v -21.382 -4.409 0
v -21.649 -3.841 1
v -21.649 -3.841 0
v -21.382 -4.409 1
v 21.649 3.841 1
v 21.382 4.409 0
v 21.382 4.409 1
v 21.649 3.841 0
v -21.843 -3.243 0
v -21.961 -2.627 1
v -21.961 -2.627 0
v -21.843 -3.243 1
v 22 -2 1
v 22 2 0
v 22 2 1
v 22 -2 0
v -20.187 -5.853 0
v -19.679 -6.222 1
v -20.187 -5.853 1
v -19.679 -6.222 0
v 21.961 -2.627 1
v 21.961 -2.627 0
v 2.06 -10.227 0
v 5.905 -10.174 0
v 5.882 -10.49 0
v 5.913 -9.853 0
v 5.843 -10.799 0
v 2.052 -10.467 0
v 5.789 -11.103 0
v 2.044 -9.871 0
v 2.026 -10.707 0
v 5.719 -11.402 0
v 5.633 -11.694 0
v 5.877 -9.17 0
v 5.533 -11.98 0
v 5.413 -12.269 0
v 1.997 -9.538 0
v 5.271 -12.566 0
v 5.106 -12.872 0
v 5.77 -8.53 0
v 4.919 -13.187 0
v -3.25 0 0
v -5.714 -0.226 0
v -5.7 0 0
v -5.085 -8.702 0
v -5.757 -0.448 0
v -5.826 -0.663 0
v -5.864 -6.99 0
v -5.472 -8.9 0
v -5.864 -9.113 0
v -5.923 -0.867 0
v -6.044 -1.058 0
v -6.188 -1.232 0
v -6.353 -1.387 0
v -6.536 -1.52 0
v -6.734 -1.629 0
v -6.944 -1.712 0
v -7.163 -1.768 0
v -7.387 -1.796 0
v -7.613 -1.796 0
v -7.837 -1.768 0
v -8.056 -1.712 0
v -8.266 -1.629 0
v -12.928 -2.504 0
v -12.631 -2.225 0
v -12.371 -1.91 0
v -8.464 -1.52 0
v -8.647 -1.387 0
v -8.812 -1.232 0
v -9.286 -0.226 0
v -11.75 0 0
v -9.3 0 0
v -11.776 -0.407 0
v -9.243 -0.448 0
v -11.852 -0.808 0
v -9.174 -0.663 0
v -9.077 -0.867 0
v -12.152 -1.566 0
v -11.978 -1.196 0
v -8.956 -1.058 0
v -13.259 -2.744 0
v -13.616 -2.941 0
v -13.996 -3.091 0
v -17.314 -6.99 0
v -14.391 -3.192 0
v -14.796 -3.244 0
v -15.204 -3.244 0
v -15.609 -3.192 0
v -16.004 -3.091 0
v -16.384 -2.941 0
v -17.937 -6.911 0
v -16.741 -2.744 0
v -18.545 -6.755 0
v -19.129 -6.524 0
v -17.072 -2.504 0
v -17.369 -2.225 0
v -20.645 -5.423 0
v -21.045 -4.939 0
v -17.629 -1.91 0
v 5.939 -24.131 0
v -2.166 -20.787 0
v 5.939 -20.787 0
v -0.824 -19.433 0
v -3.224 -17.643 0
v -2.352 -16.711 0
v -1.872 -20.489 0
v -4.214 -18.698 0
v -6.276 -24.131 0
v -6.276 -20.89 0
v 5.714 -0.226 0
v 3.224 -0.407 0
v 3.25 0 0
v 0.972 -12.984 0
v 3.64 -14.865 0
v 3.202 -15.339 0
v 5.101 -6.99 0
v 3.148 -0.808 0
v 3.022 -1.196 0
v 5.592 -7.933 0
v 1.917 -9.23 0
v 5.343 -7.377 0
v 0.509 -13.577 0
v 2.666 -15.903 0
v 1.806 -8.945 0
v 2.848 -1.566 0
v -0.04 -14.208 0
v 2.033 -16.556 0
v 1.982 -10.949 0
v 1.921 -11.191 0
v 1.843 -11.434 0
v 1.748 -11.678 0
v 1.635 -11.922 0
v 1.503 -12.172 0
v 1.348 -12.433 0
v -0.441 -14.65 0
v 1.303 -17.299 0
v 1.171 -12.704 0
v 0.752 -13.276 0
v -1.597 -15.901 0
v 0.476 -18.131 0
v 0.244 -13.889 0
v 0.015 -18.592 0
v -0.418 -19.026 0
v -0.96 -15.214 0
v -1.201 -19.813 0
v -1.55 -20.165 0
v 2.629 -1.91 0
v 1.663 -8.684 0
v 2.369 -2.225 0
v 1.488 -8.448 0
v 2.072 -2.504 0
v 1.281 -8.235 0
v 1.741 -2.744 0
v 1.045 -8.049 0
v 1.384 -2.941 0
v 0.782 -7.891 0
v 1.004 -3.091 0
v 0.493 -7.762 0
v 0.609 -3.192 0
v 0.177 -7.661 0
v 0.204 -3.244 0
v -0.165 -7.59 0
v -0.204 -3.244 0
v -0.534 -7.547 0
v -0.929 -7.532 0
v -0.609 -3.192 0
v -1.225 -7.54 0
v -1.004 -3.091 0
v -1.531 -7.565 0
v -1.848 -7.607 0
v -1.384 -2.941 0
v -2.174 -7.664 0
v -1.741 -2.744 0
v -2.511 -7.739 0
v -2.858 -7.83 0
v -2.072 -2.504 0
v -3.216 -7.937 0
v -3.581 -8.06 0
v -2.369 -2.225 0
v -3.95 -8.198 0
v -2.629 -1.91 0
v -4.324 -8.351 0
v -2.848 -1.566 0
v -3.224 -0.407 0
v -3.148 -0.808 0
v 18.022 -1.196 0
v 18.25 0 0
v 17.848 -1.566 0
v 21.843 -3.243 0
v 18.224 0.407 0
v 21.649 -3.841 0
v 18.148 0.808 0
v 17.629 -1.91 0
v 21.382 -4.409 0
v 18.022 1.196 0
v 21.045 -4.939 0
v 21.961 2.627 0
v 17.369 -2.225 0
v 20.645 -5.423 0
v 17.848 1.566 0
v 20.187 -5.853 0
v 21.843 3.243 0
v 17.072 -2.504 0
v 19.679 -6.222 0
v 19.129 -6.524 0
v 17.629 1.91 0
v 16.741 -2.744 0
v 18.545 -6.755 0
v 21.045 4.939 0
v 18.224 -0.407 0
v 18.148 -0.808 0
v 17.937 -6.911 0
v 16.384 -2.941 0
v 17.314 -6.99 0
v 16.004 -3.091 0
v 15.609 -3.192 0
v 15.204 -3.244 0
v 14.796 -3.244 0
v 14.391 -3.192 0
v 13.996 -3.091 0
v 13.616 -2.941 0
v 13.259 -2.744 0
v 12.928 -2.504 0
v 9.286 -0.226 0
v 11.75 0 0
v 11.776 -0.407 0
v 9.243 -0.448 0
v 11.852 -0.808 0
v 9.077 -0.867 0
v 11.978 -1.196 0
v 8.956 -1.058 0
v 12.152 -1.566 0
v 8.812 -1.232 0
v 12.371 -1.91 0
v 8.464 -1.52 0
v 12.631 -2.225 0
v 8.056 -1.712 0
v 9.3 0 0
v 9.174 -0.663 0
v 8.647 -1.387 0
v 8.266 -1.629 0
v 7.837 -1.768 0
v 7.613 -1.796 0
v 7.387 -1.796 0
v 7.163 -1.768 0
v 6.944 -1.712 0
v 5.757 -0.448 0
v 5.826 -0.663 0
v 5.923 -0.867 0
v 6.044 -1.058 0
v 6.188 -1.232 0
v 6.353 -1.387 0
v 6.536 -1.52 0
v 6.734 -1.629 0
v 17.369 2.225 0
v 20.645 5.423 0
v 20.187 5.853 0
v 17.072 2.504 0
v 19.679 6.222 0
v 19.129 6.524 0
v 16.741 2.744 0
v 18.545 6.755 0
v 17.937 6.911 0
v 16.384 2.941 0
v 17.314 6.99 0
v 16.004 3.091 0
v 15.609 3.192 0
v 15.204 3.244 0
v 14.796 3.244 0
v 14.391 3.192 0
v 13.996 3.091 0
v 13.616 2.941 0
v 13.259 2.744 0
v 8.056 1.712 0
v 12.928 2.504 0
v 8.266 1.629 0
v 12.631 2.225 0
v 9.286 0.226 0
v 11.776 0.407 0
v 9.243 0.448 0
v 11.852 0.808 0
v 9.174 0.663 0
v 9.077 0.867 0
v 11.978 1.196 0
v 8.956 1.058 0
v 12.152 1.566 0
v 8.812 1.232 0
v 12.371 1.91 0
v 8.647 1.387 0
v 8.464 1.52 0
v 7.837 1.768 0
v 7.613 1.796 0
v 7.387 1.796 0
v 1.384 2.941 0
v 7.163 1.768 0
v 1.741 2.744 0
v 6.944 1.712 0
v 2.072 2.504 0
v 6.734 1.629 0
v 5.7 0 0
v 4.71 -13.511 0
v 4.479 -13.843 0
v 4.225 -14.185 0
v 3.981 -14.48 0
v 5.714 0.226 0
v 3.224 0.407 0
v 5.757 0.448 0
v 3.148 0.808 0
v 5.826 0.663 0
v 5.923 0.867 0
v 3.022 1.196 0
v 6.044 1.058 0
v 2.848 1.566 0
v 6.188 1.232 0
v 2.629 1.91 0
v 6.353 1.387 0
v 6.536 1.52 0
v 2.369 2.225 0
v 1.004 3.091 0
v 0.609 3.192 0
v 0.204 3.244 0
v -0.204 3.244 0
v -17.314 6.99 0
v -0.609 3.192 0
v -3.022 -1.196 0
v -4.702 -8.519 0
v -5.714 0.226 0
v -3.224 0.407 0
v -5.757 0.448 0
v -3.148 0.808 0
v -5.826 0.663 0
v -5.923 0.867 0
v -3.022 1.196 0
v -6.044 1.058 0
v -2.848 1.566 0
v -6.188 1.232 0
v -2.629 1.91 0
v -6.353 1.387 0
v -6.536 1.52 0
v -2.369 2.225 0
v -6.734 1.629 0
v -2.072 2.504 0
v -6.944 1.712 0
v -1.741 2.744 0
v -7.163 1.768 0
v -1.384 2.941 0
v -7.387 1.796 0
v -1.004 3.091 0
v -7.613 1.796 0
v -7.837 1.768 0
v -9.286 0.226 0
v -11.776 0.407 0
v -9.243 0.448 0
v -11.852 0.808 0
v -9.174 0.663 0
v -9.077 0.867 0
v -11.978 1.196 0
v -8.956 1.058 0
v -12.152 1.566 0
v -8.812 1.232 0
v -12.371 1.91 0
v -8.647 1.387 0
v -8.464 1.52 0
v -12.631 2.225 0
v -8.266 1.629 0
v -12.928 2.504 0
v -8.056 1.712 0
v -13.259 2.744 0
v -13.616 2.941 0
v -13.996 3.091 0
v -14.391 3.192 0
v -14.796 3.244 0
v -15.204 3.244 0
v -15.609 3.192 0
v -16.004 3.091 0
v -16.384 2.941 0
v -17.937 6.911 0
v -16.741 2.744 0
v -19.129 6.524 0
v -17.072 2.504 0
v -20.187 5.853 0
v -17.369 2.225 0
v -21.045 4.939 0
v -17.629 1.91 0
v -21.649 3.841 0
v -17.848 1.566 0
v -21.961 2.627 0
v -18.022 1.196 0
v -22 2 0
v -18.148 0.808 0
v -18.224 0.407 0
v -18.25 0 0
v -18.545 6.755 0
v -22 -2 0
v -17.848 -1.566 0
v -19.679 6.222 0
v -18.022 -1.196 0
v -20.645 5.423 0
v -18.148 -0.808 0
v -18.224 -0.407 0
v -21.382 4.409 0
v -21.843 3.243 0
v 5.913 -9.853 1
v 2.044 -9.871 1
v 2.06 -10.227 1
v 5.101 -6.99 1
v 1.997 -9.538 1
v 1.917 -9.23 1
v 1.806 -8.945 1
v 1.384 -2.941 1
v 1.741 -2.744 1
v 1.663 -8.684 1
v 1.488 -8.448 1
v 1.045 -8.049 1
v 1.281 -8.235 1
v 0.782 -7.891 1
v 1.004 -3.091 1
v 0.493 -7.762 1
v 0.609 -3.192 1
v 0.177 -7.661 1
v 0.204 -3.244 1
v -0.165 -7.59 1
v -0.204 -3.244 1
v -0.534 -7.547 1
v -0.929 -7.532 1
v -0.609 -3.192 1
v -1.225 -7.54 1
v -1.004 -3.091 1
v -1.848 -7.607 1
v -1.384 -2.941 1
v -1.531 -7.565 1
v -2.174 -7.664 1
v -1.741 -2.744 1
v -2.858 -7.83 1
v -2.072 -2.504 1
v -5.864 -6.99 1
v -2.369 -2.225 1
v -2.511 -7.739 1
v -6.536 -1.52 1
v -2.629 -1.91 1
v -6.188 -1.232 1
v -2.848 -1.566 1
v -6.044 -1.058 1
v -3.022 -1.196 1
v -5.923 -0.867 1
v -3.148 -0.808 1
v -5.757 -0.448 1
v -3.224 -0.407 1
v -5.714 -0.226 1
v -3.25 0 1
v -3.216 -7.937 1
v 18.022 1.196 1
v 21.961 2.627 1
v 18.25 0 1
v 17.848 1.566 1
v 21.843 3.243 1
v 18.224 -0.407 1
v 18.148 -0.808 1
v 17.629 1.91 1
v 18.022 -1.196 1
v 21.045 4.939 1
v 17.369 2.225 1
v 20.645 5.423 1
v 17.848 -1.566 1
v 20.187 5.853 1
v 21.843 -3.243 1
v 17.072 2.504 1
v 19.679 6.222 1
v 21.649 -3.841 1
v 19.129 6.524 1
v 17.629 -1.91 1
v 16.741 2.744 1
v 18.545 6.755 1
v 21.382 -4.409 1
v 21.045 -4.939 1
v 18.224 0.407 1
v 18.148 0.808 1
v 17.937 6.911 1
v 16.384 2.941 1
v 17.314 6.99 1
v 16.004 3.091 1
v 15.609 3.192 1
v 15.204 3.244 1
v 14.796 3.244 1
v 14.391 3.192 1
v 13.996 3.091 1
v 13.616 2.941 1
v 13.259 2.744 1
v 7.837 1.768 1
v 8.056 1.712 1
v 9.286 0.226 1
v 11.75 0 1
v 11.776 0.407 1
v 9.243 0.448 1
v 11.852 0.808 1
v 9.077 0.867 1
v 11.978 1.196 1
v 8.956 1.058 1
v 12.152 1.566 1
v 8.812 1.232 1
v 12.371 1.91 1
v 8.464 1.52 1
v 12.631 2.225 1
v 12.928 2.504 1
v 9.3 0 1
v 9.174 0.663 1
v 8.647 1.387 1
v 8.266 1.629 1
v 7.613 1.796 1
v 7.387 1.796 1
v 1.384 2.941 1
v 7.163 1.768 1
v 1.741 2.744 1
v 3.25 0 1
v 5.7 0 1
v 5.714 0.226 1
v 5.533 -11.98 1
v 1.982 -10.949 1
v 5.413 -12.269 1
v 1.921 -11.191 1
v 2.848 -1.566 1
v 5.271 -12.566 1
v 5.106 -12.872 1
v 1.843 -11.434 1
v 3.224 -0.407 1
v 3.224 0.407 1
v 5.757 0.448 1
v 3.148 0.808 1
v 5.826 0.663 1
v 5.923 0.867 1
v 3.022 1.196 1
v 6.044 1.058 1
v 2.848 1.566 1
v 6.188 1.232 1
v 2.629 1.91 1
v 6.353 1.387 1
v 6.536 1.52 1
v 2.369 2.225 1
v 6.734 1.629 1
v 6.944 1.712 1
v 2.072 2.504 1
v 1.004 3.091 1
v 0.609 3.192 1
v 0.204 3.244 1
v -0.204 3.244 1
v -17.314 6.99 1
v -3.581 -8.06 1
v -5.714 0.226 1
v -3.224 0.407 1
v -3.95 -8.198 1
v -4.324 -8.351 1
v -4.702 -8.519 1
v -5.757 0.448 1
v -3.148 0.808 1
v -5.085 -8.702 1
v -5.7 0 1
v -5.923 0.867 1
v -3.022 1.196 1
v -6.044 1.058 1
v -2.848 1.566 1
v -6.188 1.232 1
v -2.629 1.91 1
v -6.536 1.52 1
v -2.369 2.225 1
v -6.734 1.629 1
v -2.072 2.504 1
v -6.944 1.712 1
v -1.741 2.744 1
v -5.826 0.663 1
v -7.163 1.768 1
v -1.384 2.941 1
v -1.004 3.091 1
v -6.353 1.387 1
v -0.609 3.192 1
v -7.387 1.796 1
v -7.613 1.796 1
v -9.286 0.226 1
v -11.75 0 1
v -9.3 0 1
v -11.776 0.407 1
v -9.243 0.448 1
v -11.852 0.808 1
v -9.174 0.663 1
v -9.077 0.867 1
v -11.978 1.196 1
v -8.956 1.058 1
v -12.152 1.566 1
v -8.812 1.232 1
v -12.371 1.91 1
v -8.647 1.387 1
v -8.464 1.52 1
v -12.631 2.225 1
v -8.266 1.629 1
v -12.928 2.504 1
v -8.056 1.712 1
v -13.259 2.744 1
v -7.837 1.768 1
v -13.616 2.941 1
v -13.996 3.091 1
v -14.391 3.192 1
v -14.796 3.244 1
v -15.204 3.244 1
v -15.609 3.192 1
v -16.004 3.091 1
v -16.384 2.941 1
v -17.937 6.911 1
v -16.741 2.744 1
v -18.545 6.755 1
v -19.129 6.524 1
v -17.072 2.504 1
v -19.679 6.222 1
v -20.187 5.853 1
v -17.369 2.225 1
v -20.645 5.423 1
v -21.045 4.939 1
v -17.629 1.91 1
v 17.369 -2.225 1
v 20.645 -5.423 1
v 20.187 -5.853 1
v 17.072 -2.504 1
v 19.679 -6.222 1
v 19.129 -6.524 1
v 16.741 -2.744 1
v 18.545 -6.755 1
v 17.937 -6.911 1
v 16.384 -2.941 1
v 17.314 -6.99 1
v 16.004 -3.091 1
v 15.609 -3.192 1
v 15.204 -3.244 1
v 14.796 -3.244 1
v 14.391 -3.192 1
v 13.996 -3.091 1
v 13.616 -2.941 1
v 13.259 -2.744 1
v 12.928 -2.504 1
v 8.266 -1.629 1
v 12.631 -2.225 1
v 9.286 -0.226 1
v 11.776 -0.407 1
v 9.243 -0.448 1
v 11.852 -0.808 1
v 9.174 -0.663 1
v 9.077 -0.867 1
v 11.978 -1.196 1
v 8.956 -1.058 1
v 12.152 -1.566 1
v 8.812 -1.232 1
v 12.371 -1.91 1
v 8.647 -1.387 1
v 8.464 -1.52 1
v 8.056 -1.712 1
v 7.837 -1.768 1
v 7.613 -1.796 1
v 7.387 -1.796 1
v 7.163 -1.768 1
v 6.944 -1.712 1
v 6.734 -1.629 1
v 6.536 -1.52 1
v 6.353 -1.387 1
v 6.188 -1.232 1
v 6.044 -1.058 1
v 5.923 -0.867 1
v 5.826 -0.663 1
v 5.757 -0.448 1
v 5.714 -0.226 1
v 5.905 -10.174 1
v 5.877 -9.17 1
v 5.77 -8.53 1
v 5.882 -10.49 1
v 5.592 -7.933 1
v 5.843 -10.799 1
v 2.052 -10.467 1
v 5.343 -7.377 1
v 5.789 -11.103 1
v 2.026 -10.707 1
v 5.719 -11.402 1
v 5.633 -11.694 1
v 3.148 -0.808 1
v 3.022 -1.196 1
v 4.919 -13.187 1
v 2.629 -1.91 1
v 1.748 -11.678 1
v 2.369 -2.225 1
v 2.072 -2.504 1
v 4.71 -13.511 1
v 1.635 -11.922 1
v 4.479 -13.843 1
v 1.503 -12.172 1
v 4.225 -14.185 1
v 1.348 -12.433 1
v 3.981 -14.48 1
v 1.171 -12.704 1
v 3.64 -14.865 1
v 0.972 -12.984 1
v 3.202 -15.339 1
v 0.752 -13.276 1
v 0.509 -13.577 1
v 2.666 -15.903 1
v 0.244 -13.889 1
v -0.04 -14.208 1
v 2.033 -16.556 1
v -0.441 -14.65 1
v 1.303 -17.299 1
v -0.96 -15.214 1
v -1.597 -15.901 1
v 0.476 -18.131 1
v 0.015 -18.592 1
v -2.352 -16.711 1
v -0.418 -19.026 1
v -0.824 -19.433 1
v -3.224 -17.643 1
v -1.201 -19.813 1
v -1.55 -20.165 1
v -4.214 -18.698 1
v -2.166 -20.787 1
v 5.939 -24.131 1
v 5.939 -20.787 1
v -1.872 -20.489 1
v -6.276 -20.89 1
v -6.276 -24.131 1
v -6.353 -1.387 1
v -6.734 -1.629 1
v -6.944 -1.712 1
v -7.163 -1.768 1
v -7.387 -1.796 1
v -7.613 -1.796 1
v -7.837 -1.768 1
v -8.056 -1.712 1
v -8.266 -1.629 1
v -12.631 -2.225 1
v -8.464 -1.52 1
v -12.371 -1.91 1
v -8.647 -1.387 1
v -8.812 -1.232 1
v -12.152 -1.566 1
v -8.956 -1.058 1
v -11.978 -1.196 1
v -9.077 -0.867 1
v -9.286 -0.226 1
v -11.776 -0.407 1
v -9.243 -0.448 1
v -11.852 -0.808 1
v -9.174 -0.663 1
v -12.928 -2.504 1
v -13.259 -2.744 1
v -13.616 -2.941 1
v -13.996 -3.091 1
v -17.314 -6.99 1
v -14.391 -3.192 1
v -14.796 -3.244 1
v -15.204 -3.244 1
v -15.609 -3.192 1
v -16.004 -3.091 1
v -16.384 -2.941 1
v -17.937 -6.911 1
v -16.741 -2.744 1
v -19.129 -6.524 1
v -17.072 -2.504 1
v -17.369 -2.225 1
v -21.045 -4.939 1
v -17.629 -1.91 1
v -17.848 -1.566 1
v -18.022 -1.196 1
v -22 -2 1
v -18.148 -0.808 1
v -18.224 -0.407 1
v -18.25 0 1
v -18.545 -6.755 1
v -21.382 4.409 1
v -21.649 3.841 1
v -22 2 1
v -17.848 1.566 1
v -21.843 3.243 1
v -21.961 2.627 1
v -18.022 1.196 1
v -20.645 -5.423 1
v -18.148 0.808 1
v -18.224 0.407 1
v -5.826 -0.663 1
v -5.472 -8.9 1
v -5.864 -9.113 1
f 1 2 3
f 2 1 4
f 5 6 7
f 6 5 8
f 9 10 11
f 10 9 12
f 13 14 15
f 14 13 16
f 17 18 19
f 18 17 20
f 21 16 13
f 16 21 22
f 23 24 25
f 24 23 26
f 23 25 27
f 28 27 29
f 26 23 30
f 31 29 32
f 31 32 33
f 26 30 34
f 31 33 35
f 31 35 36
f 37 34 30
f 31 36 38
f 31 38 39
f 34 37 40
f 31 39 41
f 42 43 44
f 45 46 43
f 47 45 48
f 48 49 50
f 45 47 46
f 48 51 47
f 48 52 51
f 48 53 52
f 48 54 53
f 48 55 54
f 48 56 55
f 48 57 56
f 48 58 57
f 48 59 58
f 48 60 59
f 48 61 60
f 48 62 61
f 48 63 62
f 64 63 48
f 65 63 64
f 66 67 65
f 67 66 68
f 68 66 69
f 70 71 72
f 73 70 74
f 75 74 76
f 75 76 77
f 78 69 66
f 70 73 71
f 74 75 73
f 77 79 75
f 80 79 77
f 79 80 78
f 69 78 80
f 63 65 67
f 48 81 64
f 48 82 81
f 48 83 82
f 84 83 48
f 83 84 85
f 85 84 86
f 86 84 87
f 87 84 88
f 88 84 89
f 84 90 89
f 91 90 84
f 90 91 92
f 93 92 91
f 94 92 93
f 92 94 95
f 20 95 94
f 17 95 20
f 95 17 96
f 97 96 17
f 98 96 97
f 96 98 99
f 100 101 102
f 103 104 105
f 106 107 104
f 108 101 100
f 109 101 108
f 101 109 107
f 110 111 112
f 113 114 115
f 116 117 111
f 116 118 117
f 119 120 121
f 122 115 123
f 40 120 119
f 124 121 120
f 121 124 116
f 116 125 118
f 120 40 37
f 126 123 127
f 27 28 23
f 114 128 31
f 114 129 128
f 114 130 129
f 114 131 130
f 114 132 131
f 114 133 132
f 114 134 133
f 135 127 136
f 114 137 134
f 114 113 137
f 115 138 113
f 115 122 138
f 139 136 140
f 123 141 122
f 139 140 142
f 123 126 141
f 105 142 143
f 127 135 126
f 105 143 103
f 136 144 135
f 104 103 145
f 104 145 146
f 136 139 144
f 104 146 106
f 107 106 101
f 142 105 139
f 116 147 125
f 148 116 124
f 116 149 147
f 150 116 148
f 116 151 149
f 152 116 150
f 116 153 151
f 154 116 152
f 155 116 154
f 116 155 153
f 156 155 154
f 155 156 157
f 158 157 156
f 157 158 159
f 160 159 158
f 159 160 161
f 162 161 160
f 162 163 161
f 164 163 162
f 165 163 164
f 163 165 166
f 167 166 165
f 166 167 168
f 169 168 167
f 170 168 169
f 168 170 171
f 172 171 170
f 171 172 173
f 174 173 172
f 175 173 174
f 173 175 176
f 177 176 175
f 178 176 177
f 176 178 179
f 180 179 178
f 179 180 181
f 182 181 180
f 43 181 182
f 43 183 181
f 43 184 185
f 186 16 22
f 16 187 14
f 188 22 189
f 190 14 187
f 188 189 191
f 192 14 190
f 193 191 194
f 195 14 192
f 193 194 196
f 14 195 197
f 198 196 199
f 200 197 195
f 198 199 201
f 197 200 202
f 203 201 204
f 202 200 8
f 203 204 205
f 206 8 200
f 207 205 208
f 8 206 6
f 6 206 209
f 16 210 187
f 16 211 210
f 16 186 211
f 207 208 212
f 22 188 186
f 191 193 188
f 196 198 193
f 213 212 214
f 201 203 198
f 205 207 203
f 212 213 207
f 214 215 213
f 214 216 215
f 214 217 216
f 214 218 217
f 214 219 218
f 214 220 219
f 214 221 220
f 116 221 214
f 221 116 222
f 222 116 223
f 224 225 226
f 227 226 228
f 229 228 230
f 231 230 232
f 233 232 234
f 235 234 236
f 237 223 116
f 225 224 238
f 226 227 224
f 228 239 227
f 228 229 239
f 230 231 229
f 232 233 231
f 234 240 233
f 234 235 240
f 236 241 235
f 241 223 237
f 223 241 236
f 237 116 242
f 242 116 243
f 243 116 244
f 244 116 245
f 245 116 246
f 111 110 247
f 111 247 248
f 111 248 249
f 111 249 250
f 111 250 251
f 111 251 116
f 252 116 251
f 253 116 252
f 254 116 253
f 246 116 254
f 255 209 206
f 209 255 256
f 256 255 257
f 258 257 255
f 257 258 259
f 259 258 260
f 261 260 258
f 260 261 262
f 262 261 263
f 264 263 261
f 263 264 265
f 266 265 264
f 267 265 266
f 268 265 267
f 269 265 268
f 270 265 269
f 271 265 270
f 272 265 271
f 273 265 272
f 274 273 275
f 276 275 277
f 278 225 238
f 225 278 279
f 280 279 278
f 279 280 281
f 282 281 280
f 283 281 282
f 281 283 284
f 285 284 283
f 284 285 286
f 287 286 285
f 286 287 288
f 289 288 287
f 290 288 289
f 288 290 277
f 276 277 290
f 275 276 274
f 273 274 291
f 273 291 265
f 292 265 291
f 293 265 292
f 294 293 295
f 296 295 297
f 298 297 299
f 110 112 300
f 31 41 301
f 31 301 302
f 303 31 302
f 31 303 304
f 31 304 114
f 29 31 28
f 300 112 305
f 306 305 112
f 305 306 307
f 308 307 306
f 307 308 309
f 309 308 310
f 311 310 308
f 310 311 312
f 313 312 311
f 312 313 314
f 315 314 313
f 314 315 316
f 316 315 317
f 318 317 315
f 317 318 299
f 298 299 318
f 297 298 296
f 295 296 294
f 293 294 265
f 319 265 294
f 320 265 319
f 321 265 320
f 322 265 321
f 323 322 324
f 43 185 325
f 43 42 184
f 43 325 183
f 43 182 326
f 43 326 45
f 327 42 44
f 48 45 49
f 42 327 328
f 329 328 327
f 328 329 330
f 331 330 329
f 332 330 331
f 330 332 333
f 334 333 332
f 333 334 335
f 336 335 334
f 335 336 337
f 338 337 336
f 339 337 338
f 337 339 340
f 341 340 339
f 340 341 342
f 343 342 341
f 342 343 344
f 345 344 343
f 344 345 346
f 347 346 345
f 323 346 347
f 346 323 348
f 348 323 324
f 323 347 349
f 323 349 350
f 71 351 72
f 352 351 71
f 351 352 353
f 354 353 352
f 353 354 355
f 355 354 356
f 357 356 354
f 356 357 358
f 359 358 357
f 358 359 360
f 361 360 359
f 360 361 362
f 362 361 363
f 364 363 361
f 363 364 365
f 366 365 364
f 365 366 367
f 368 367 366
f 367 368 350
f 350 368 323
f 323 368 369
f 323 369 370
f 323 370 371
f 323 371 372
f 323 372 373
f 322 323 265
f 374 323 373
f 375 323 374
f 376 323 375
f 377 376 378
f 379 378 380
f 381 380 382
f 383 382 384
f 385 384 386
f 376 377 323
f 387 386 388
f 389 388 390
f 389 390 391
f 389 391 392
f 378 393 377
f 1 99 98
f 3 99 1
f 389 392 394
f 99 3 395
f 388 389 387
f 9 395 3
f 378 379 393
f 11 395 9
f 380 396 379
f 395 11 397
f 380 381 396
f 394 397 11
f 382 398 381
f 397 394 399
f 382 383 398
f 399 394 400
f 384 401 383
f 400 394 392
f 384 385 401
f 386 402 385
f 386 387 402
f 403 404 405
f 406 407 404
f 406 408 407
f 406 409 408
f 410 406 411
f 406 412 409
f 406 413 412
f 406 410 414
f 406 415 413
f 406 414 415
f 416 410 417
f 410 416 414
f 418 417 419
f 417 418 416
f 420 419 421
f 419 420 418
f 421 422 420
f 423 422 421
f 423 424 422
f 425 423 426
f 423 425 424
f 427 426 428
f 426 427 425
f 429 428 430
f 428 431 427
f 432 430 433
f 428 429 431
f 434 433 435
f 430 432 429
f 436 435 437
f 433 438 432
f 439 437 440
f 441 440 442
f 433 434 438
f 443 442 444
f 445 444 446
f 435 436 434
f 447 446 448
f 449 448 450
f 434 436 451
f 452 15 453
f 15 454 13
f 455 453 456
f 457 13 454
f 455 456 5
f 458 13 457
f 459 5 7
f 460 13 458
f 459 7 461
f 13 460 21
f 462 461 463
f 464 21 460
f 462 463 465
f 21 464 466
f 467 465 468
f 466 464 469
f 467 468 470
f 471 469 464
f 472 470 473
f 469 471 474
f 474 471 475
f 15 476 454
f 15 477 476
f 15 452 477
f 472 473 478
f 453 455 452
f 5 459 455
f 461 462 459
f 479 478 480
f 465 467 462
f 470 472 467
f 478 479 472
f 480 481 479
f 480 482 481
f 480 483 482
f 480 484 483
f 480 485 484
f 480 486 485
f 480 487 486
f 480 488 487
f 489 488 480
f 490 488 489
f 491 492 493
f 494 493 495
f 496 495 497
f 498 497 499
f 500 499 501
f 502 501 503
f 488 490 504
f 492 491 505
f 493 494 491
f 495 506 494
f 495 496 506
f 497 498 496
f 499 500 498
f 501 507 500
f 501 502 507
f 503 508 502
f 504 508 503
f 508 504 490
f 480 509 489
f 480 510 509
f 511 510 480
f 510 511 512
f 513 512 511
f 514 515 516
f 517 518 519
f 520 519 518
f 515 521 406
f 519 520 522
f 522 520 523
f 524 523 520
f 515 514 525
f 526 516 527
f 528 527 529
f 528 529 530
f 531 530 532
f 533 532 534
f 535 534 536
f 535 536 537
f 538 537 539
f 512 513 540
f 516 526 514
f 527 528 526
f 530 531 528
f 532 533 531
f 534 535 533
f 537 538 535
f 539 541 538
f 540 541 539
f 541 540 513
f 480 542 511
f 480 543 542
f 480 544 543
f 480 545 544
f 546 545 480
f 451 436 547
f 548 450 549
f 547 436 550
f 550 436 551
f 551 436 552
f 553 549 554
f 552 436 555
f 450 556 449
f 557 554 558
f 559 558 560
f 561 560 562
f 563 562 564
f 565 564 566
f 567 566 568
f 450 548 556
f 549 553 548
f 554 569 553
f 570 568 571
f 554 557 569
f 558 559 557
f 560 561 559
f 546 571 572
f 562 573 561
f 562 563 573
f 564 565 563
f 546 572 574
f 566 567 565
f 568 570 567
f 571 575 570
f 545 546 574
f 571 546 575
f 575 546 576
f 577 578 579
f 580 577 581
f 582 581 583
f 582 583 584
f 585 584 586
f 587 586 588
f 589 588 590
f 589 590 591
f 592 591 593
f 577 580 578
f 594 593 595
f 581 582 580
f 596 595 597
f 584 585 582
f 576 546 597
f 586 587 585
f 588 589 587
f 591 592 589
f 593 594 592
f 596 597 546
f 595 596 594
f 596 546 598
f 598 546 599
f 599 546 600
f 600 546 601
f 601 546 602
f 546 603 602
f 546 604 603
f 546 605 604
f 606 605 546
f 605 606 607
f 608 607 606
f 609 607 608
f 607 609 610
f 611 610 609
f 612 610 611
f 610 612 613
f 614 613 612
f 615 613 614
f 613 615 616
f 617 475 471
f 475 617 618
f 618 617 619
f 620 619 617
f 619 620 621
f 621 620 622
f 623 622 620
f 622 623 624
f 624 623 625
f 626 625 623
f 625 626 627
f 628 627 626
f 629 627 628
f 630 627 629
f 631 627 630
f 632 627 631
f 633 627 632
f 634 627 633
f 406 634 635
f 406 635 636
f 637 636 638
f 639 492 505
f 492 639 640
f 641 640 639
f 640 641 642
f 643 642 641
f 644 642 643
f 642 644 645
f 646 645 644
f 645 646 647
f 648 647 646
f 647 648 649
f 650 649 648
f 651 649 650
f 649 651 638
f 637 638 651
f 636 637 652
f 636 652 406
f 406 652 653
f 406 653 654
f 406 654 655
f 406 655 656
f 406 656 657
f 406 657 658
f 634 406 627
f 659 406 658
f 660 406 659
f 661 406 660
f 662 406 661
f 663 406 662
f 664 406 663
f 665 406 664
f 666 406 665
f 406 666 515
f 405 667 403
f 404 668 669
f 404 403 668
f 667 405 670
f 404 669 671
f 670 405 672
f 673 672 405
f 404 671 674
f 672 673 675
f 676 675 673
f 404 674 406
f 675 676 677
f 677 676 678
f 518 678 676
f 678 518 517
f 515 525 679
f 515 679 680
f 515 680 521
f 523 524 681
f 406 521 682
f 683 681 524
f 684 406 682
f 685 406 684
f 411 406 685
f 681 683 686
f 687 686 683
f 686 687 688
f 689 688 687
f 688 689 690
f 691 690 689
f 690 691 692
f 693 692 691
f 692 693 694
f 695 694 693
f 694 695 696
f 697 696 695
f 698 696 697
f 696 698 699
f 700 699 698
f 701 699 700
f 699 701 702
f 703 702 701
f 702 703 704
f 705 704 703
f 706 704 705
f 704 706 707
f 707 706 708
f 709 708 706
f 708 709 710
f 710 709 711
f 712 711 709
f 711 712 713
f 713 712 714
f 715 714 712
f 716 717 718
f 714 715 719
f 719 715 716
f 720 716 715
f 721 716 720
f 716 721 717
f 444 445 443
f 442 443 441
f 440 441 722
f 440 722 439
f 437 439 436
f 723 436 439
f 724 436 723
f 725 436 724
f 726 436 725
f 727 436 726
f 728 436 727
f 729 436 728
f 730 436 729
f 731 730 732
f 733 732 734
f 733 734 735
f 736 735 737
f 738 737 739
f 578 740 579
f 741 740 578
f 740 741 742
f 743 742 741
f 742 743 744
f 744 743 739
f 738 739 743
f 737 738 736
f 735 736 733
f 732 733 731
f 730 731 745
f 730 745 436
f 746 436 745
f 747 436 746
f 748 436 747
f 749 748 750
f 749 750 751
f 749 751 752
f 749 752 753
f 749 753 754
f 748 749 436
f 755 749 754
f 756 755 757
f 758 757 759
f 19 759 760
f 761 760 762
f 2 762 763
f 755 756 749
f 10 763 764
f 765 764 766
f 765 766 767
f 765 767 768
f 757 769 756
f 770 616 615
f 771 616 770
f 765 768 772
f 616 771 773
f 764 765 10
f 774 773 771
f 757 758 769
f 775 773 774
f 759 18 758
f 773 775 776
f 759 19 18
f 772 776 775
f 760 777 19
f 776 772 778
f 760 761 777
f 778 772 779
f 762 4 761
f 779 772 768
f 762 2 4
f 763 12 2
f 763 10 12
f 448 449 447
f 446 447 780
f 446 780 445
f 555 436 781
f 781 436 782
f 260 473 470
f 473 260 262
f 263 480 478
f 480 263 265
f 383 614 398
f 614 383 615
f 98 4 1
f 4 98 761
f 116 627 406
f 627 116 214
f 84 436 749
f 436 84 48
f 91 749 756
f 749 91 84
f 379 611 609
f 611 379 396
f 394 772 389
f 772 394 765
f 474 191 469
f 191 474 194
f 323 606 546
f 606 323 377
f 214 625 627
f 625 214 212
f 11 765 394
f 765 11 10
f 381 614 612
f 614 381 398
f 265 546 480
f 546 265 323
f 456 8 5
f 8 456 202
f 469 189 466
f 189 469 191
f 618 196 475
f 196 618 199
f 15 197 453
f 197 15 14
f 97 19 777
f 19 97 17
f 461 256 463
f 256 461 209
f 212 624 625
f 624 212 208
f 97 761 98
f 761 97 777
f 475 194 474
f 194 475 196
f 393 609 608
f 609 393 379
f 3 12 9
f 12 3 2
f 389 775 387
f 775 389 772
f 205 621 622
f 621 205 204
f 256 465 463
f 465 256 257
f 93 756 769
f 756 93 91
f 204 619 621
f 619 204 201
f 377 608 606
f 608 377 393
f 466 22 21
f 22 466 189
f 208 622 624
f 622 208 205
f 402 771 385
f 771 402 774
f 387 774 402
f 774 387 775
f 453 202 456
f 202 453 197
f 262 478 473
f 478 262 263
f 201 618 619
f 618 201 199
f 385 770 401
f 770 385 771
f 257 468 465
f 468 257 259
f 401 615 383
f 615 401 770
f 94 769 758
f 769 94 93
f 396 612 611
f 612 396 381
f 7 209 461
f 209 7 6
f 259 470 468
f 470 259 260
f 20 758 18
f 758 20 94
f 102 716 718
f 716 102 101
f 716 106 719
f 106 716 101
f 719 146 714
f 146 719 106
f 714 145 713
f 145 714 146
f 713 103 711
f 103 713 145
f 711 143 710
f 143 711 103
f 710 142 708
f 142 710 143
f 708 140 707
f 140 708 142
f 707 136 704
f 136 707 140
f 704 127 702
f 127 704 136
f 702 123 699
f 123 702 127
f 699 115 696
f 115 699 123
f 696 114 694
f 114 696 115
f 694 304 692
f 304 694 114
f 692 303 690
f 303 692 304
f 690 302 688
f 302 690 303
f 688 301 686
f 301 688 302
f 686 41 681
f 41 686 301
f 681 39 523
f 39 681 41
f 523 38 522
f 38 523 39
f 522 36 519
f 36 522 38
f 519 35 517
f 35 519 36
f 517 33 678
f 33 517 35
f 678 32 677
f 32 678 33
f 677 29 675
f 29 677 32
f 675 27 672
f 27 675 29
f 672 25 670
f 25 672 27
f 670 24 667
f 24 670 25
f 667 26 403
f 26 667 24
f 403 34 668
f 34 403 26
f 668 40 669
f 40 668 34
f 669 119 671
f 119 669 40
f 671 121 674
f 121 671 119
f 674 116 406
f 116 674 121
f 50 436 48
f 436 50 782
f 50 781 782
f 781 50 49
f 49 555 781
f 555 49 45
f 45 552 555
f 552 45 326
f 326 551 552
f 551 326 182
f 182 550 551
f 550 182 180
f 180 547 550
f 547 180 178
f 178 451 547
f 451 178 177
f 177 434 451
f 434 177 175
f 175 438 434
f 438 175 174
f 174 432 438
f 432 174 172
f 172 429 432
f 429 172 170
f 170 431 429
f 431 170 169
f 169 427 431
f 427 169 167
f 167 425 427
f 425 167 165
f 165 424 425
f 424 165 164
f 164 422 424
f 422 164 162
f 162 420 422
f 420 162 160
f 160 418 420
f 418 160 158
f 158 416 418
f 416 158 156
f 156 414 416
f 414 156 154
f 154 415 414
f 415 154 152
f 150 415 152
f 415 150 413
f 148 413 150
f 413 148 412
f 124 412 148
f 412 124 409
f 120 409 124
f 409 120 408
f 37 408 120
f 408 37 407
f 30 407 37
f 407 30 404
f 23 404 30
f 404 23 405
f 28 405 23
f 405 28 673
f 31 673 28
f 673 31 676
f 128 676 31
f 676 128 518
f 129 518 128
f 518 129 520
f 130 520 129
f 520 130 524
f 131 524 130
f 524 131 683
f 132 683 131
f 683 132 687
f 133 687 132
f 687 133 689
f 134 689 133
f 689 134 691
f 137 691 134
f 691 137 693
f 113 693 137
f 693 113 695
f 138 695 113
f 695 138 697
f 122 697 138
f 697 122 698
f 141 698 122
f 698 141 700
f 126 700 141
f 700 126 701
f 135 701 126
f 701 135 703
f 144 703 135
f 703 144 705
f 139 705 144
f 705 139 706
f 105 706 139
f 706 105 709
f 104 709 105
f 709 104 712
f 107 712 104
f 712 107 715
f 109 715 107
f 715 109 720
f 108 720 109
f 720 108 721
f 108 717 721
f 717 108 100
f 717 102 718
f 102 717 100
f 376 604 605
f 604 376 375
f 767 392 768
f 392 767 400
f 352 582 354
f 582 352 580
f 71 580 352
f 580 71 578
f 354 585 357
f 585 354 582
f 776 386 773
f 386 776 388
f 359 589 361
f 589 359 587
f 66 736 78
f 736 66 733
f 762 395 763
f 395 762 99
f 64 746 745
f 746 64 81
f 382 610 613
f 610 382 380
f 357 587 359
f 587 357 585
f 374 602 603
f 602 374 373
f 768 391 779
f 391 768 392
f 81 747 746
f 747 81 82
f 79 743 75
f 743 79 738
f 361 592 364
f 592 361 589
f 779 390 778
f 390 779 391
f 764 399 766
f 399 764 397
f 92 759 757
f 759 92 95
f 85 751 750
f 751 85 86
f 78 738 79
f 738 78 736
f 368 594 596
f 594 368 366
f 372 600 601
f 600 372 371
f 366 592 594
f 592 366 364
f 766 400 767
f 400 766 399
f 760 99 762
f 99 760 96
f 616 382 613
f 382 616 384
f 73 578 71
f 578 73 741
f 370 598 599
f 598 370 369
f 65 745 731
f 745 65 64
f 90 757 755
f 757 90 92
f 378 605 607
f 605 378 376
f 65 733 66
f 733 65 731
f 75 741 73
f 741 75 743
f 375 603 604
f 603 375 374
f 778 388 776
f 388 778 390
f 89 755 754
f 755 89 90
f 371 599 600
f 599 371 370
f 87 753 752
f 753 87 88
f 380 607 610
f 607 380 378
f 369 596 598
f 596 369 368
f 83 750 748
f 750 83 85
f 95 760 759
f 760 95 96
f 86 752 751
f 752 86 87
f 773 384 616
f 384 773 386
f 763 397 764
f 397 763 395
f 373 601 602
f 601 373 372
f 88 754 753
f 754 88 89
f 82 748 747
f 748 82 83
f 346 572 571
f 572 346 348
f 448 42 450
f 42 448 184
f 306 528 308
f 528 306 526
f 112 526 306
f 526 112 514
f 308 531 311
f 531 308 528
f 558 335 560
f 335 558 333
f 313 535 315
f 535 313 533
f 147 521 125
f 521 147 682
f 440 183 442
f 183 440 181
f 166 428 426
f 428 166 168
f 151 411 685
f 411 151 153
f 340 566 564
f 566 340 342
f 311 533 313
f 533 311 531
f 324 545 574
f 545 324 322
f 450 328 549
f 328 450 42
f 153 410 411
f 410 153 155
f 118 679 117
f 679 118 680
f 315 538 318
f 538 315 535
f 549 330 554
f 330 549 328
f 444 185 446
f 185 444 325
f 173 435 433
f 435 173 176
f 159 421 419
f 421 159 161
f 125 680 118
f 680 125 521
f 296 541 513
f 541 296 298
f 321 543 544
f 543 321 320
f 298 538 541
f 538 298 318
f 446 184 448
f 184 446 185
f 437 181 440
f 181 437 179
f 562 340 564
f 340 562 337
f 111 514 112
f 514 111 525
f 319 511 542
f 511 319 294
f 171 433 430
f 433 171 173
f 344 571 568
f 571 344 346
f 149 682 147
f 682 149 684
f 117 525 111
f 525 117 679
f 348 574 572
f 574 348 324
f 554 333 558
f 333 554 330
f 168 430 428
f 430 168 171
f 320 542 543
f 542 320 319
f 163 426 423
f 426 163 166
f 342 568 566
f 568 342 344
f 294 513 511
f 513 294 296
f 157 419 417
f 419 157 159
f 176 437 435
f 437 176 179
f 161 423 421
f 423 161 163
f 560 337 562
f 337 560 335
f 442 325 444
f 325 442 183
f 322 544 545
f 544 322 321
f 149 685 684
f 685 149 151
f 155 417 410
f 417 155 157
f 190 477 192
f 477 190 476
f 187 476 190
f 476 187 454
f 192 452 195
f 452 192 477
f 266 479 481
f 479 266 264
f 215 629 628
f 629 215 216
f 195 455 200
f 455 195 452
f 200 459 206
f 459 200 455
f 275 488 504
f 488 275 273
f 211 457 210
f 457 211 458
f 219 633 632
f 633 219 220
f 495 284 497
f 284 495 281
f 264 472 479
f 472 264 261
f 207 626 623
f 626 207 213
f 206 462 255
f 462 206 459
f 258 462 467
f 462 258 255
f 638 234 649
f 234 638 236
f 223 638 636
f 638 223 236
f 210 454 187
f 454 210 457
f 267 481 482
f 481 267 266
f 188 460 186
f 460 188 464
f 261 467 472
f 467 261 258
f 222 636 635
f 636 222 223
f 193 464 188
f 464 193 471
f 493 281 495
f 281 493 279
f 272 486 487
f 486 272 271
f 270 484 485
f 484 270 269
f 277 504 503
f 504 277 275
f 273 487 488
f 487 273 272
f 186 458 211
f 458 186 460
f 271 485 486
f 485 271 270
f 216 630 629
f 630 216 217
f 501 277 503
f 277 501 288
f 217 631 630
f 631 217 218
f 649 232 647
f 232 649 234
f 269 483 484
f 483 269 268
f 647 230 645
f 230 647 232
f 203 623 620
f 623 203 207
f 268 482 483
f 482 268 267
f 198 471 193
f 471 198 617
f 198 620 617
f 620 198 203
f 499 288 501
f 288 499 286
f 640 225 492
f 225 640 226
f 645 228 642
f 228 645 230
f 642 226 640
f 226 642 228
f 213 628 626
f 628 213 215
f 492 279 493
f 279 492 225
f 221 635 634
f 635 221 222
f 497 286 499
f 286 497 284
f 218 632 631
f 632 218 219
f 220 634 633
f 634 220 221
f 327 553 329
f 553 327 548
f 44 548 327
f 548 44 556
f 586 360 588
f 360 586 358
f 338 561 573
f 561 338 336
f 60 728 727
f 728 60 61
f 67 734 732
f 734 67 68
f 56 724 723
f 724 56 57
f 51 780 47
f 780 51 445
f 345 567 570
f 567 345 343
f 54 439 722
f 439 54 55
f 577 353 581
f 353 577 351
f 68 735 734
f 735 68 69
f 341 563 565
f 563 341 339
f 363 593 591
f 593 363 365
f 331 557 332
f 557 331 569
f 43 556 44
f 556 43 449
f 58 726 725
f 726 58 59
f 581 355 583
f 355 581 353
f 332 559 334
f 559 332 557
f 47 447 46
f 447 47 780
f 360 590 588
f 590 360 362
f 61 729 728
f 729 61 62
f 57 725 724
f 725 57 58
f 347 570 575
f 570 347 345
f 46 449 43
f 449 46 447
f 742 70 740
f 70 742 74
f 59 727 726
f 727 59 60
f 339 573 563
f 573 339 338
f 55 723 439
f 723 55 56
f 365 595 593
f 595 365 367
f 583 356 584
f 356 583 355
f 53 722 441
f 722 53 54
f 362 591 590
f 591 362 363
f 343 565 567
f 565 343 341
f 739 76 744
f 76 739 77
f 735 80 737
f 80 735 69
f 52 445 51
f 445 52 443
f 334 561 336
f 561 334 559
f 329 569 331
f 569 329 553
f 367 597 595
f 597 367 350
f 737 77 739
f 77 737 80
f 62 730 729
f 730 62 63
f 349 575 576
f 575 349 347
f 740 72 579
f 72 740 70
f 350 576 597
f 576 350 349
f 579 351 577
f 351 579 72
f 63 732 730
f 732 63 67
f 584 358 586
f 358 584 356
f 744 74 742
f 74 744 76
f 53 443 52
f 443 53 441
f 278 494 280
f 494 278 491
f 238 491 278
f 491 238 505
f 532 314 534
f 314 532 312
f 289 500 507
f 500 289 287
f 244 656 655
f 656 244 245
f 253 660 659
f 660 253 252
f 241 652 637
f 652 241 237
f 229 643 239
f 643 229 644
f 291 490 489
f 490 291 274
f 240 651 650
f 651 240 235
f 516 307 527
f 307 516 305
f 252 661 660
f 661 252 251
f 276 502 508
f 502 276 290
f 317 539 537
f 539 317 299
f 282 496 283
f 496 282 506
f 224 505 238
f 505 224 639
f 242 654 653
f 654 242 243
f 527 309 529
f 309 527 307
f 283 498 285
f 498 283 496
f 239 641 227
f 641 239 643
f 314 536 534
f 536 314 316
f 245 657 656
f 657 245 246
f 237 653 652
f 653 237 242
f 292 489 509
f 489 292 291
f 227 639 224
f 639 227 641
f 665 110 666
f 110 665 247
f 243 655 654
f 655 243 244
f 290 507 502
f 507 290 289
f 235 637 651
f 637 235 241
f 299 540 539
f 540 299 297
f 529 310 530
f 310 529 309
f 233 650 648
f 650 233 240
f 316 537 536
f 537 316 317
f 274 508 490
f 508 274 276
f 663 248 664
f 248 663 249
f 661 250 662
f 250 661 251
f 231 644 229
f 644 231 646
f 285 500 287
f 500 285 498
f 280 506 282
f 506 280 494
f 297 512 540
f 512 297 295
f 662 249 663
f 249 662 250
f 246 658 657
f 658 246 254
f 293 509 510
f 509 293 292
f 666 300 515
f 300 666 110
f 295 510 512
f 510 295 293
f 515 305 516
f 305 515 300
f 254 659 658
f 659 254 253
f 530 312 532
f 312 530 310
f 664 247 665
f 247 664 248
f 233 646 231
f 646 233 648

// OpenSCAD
$fn = 50;


difference() {
	union() {
		*color(alpha = 1.0000000000, c = "gray") {
			translate(v = [0, 14, 0]) {
				linear_extrude(height = 1) {
					text(font = "Arial:style=Bold", halign = "center", size = 4.5000000000, text = "COMMENT description oobb_plate_shape_p_type_1_depth_3_width_1_thickness_2_extra_oobb_size", valign = "center");
				}
			}
		}
		hull() {
			translate(v = [-17.0000000000, 2.0000000000, 0]) {
				cylinder(h = 1, r = 5);
			}
			translate(v = [17.0000000000, 2.0000000000, 0]) {
				cylinder(h = 1, r = 5);
			}
			translate(v = [-17.0000000000, -2.0000000000, 0]) {
				cylinder(h = 1, r = 5);
			}
			translate(v = [17.0000000000, -2.0000000000, 0]) {
				cylinder(h = 1, r = 5);
			}
		}
		translate(v = [0, -5, 0]) {
			linear_extrude(height = 1) {
				text(font = "DejaVu Sans Mono:style=Bold", halign = "center", size = 19.0000000000, text = "2", valign = "top");
			}
		}
	}
	union() {
		*color(alpha = 1.0000000000, c = "gray") {
			translate(v = [0, 14, 0]) {
				linear_extrude(height = 1) {
					text(font = "Arial:style=Bold", halign = "center", size = 4.5000000000, text = "COMMENT description oobb_holes_shape_n_type_3_width_1_thickness_2_extra_oobb_size_1_height_'all'_holes_true_both_holes", valign = "center");
				}
			}
		}
		translate(v = [-15.0000000000, 0.0000000000, 0]) {
			translate(v = [0, 0, -50]) {
				cylinder(h = 100, r = 3.2500000000);
			}
		}
		translate(v = [0, 0, -50]) {
			cylinder(h = 100, r = 3.2500000000);
		}
		translate(v = [15.0000000000, 0.0000000000, 0]) {
			translate(v = [0, 0, -50]) {
				cylinder(h = 100, r = 3.2500000000);
			}
		}
		translate(v = [-15.0000000000, 0.0000000000, 0]) {
			translate(v = [0, 0, -50]) {
				cylinder(h = 100, r = 1.8000000000);
			}
		}
		translate(v = [-7.5000000000, 0.0000000000, 0]) {
			translate(v = [0, 0, -50]) {
				cylinder(h = 100, r = 1.8000000000);
			}
		}
		translate(v = [0, 0, -50]) {
			cylinder(h = 100, r = 1.8000000000);
		}
		translate(v = [7.5000000000, 0.0000000000, 0]) {
			translate(v = [0, 0, -50]) {
				cylinder(h = 100, r = 1.8000000000);
			}
		}
		translate(v = [15.0000000000, 0.0000000000, 0]) {
			translate(v = [0, 0, -50]) {
				cylinder(h = 100, r = 1.8000000000);
			}
		}
	}
}
